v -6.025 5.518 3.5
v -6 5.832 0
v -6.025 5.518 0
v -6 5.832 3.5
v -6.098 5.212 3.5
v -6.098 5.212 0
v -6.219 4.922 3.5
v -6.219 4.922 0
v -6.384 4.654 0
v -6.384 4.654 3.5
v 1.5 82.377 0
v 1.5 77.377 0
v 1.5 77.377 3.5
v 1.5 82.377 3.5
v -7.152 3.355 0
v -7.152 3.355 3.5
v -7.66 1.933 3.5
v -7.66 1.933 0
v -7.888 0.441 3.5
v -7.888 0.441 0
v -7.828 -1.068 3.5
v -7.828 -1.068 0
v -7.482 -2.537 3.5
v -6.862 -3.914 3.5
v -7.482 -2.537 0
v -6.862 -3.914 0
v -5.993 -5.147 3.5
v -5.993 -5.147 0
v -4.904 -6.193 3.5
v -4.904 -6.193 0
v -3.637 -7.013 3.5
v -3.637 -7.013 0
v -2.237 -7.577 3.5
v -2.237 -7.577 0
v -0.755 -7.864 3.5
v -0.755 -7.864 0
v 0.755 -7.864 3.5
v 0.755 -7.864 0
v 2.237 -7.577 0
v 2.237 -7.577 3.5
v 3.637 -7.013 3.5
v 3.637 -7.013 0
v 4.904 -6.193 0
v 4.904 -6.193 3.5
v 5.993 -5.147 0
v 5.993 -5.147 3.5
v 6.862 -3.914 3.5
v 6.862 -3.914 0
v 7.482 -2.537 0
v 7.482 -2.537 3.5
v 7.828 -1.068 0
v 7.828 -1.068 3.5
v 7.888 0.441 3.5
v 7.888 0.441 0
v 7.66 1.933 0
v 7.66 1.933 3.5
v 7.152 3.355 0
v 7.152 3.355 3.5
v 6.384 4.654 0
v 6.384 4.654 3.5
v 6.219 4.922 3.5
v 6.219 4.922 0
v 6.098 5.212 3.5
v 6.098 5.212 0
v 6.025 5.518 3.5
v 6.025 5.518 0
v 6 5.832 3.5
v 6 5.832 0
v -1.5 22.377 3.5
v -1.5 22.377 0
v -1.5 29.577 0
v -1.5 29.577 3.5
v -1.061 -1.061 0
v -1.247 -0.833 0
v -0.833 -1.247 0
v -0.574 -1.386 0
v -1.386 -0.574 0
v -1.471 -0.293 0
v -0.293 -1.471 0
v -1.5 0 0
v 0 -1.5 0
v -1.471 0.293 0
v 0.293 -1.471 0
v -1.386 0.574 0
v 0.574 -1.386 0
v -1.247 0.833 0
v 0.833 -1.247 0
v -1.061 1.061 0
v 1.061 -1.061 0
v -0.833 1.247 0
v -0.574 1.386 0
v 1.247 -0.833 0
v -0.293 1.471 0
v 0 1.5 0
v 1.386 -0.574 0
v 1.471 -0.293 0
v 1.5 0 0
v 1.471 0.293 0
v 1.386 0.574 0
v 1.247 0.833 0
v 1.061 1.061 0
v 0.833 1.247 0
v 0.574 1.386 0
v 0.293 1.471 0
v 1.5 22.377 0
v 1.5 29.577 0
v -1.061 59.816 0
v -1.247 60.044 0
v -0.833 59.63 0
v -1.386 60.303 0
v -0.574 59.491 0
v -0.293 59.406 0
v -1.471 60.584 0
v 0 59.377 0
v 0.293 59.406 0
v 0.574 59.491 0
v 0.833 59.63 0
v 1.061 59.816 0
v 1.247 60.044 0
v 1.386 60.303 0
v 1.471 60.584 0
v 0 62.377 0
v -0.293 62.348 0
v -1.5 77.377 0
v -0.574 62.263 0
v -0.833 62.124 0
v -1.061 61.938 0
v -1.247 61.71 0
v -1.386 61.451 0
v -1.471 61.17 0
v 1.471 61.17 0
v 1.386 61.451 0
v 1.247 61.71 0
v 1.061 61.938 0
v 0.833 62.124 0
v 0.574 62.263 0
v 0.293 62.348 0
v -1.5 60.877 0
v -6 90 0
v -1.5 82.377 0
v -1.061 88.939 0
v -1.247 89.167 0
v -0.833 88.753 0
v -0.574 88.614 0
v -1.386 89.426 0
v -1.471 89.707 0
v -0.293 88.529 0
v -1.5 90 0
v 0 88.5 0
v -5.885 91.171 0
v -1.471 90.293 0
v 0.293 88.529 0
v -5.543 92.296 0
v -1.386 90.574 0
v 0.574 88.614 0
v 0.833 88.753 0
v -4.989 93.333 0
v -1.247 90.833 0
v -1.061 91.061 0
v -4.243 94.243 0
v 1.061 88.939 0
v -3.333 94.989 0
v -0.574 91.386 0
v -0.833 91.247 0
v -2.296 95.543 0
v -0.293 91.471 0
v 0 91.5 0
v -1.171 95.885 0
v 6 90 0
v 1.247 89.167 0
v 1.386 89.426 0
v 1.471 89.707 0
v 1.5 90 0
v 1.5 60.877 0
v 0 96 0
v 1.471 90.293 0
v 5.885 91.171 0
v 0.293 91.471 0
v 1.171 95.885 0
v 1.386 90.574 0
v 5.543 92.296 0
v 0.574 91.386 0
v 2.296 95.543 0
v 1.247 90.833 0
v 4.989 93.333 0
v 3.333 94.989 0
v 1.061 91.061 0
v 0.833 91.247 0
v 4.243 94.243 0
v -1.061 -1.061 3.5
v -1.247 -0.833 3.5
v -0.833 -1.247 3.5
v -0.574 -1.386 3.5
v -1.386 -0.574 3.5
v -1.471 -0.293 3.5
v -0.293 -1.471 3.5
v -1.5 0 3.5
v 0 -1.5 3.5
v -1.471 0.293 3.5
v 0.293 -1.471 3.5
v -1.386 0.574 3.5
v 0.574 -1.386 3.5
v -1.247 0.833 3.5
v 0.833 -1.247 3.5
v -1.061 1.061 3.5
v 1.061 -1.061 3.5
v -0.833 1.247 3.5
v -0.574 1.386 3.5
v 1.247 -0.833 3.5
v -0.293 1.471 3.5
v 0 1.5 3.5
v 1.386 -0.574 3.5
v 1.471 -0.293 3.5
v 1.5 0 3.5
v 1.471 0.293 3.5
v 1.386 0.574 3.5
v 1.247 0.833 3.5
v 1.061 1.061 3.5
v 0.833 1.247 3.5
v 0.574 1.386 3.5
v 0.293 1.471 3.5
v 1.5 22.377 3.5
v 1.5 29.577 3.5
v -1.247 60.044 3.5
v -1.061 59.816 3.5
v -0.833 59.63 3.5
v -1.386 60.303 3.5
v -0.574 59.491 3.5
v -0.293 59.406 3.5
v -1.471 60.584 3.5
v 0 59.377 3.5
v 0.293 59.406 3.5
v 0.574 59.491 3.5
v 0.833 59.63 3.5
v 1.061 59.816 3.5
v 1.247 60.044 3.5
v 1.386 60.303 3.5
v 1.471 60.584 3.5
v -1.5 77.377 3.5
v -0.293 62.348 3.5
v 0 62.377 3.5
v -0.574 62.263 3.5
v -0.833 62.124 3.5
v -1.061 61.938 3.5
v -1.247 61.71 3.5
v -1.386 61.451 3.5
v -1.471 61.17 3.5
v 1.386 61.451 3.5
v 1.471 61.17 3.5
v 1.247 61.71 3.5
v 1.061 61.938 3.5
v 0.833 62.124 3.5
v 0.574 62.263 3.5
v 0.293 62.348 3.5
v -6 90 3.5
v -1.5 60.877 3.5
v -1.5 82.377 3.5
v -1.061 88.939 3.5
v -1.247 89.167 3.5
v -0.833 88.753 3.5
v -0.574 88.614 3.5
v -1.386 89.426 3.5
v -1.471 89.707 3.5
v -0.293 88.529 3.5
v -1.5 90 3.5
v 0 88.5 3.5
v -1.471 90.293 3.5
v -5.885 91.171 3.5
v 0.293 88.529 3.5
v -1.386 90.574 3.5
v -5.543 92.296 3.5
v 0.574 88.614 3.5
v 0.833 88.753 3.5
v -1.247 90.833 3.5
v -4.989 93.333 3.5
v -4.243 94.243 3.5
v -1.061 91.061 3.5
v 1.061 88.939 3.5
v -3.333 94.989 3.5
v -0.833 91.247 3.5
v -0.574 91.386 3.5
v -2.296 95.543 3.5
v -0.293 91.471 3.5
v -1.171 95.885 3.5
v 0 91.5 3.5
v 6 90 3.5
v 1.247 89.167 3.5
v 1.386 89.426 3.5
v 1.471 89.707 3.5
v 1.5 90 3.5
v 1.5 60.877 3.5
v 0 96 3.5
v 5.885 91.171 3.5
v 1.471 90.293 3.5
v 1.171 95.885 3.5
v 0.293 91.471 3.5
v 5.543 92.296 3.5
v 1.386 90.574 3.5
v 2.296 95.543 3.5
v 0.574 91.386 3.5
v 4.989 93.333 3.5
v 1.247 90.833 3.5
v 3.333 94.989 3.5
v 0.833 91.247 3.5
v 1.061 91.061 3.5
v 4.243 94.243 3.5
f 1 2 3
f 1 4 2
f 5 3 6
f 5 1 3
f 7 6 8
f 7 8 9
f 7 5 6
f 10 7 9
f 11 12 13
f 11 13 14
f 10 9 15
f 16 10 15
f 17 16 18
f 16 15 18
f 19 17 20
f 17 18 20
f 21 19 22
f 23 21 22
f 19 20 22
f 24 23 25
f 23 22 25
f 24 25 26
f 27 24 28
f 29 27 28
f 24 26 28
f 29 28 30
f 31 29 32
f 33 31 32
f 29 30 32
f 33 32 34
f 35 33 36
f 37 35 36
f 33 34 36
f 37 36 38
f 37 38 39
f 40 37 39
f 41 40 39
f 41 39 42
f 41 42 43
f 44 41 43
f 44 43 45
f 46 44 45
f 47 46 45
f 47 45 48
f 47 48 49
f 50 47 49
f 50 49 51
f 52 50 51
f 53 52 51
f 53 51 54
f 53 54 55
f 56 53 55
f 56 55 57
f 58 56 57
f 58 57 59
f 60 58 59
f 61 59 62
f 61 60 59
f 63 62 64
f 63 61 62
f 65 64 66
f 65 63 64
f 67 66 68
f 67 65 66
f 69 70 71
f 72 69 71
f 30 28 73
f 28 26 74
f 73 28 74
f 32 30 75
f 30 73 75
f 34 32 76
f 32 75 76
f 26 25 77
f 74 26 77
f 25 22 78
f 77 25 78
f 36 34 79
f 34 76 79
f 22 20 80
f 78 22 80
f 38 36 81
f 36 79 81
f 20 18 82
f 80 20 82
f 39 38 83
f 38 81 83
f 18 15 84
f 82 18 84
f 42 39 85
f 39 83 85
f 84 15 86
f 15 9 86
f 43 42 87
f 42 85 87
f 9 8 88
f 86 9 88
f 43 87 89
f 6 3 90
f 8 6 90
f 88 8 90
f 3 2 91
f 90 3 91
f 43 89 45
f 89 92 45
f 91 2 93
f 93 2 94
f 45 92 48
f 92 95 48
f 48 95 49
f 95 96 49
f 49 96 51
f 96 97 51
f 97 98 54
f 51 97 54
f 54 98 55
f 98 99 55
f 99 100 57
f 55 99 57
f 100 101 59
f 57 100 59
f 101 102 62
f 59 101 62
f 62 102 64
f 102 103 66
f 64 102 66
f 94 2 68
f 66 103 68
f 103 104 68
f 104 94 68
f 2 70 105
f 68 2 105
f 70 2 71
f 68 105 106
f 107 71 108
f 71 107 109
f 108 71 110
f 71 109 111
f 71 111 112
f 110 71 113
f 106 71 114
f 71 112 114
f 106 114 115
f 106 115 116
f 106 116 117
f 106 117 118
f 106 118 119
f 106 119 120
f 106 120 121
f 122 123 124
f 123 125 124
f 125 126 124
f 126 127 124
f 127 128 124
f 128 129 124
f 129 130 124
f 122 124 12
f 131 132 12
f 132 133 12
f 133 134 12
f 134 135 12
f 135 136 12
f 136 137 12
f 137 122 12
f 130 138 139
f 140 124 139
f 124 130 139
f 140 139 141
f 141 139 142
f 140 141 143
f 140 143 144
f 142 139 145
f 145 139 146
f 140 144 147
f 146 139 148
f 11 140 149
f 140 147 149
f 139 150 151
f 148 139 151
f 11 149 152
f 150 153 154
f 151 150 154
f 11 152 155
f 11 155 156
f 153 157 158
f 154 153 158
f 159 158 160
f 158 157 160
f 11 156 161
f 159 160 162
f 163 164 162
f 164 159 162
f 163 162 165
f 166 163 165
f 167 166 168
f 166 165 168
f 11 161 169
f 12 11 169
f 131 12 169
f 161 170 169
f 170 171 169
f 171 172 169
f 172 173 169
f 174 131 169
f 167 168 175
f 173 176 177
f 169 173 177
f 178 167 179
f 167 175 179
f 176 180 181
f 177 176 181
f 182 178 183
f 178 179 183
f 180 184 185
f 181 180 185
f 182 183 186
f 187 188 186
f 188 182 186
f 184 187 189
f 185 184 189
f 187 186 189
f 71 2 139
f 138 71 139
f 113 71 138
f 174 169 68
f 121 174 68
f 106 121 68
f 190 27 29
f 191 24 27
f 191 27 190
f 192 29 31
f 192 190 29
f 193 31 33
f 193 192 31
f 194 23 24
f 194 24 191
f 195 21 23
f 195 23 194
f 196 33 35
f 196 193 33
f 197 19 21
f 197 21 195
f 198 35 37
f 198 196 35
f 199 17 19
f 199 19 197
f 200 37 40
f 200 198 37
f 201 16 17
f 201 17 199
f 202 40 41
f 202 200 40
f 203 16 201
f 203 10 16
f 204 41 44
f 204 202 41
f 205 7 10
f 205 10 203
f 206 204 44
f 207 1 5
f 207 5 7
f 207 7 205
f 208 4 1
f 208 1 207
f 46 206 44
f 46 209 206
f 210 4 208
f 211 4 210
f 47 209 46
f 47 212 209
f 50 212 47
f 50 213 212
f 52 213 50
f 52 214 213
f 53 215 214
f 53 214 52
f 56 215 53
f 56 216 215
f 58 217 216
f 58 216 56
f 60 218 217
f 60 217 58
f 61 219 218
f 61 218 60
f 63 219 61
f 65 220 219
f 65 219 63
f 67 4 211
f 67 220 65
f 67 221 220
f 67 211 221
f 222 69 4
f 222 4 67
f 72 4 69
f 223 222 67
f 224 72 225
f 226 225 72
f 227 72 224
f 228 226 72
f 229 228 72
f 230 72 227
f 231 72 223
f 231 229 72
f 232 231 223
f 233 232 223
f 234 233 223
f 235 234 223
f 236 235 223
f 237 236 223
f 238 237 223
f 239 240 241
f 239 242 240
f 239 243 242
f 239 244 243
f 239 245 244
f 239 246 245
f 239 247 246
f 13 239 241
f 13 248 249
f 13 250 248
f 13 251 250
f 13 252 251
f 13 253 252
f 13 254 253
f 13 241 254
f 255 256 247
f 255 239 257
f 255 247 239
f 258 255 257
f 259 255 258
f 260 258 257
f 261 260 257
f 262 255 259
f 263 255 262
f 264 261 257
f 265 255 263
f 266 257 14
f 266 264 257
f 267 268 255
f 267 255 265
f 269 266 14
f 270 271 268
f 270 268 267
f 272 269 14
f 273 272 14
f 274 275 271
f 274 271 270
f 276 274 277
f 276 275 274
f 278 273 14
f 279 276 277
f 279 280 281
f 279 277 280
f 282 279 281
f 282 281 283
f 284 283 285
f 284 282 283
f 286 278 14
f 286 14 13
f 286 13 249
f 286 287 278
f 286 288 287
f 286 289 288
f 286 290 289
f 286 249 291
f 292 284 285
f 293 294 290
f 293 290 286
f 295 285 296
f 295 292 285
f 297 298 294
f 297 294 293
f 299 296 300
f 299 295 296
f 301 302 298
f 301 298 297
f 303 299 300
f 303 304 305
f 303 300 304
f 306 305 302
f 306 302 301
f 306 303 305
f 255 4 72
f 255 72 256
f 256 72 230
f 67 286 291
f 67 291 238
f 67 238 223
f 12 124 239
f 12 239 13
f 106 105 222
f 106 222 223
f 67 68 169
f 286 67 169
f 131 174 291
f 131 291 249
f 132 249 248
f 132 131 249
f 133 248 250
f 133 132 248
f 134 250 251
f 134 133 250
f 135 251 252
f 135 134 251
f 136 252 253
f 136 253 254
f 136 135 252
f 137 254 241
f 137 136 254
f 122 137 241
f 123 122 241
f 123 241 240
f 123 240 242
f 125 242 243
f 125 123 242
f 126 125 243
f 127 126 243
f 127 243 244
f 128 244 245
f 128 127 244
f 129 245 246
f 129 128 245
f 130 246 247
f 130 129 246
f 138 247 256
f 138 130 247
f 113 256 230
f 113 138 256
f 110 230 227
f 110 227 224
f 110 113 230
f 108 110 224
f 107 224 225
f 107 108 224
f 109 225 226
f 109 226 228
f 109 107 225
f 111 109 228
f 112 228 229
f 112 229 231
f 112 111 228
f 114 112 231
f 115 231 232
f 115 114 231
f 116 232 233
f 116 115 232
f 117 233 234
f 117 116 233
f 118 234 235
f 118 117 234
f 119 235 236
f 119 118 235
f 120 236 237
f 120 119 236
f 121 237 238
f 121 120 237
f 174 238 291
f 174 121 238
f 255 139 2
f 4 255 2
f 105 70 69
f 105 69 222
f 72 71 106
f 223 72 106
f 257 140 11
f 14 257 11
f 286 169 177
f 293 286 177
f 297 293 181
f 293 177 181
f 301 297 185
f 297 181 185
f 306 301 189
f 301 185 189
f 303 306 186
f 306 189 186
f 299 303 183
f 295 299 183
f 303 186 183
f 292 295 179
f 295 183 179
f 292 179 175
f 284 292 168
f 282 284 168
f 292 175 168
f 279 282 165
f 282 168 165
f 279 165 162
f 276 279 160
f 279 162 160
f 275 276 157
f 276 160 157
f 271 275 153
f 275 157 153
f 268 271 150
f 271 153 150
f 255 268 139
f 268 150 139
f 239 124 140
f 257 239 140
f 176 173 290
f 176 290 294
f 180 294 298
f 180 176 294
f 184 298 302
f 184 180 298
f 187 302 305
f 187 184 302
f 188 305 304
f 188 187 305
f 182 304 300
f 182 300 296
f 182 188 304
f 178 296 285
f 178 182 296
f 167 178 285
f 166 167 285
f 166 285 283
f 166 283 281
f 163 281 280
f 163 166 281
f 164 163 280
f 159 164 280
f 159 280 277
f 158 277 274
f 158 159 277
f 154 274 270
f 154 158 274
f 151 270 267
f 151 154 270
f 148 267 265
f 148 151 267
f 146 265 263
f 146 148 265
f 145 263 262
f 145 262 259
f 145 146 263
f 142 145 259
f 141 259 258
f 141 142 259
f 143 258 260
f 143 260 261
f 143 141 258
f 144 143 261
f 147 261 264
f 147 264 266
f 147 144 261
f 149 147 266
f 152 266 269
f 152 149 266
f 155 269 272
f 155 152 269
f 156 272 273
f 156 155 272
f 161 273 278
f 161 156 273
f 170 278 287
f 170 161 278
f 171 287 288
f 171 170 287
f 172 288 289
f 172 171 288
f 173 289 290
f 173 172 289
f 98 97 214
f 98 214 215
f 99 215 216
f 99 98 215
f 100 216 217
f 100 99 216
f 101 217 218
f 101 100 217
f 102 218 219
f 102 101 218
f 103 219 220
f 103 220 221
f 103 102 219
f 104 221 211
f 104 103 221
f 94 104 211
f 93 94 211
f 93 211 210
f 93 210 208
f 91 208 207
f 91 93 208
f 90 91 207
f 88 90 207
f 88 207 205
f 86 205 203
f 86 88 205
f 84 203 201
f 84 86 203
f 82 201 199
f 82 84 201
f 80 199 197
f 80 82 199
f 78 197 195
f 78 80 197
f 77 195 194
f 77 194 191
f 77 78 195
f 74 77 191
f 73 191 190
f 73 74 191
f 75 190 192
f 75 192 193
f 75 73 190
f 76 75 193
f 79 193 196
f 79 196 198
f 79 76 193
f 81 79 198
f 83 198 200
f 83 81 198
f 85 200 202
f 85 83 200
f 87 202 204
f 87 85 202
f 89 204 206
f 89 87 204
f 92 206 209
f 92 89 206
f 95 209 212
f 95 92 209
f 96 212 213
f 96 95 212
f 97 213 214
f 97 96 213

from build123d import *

# Parameters (mm, degrees)
SKETCH1_R           = 1.5
SKETCH1_W           = 3
SKETCH1_H           = 7.2
SKETCH1_H_2         = 5
BOSS_EXTRUDE1_DEPTH = 3.5
FILLET1_R           = 2


with BuildPart() as part:
    # Sketch1 → Boss-Extrude1 (new body)
    with BuildSketch(Plane.XY):
        with BuildLine():
            Line((-6, 90), (-6, 5.139066063))
            ThreePointArc((-6, 5.139066063), (0, -7.9), (6, 5.139066063))
            Line((6, 5.139066063), (6, 90))
            ThreePointArc((6, 90), (0, 96), (-6, 90))
        make_face()
        Circle(SKETCH1_R, mode=Mode.SUBTRACT)
        with Locations((0, 60.876985236)):
            Circle(SKETCH1_R, mode=Mode.SUBTRACT)
        with Locations((0, 90)):
            Circle(SKETCH1_R, mode=Mode.SUBTRACT)
        with Locations((0, 25.976985236)):
            Rectangle(SKETCH1_W, SKETCH1_H, mode=Mode.SUBTRACT)
        with Locations((0, 79.876985236)):
            Rectangle(SKETCH1_W, SKETCH1_H_2, mode=Mode.SUBTRACT)
    extrude(amount=BOSS_EXTRUDE1_DEPTH)

    # Fillet1
    fillet1_edges = [part.edges().sort_by_distance(p)[0] for p in [
        (6, 5.139066063, 1.75),
        (-6, 5.139066063, 1.75),
    ]]
    fillet(fillet1_edges, radius=FILLET1_R)


solid = part.part
